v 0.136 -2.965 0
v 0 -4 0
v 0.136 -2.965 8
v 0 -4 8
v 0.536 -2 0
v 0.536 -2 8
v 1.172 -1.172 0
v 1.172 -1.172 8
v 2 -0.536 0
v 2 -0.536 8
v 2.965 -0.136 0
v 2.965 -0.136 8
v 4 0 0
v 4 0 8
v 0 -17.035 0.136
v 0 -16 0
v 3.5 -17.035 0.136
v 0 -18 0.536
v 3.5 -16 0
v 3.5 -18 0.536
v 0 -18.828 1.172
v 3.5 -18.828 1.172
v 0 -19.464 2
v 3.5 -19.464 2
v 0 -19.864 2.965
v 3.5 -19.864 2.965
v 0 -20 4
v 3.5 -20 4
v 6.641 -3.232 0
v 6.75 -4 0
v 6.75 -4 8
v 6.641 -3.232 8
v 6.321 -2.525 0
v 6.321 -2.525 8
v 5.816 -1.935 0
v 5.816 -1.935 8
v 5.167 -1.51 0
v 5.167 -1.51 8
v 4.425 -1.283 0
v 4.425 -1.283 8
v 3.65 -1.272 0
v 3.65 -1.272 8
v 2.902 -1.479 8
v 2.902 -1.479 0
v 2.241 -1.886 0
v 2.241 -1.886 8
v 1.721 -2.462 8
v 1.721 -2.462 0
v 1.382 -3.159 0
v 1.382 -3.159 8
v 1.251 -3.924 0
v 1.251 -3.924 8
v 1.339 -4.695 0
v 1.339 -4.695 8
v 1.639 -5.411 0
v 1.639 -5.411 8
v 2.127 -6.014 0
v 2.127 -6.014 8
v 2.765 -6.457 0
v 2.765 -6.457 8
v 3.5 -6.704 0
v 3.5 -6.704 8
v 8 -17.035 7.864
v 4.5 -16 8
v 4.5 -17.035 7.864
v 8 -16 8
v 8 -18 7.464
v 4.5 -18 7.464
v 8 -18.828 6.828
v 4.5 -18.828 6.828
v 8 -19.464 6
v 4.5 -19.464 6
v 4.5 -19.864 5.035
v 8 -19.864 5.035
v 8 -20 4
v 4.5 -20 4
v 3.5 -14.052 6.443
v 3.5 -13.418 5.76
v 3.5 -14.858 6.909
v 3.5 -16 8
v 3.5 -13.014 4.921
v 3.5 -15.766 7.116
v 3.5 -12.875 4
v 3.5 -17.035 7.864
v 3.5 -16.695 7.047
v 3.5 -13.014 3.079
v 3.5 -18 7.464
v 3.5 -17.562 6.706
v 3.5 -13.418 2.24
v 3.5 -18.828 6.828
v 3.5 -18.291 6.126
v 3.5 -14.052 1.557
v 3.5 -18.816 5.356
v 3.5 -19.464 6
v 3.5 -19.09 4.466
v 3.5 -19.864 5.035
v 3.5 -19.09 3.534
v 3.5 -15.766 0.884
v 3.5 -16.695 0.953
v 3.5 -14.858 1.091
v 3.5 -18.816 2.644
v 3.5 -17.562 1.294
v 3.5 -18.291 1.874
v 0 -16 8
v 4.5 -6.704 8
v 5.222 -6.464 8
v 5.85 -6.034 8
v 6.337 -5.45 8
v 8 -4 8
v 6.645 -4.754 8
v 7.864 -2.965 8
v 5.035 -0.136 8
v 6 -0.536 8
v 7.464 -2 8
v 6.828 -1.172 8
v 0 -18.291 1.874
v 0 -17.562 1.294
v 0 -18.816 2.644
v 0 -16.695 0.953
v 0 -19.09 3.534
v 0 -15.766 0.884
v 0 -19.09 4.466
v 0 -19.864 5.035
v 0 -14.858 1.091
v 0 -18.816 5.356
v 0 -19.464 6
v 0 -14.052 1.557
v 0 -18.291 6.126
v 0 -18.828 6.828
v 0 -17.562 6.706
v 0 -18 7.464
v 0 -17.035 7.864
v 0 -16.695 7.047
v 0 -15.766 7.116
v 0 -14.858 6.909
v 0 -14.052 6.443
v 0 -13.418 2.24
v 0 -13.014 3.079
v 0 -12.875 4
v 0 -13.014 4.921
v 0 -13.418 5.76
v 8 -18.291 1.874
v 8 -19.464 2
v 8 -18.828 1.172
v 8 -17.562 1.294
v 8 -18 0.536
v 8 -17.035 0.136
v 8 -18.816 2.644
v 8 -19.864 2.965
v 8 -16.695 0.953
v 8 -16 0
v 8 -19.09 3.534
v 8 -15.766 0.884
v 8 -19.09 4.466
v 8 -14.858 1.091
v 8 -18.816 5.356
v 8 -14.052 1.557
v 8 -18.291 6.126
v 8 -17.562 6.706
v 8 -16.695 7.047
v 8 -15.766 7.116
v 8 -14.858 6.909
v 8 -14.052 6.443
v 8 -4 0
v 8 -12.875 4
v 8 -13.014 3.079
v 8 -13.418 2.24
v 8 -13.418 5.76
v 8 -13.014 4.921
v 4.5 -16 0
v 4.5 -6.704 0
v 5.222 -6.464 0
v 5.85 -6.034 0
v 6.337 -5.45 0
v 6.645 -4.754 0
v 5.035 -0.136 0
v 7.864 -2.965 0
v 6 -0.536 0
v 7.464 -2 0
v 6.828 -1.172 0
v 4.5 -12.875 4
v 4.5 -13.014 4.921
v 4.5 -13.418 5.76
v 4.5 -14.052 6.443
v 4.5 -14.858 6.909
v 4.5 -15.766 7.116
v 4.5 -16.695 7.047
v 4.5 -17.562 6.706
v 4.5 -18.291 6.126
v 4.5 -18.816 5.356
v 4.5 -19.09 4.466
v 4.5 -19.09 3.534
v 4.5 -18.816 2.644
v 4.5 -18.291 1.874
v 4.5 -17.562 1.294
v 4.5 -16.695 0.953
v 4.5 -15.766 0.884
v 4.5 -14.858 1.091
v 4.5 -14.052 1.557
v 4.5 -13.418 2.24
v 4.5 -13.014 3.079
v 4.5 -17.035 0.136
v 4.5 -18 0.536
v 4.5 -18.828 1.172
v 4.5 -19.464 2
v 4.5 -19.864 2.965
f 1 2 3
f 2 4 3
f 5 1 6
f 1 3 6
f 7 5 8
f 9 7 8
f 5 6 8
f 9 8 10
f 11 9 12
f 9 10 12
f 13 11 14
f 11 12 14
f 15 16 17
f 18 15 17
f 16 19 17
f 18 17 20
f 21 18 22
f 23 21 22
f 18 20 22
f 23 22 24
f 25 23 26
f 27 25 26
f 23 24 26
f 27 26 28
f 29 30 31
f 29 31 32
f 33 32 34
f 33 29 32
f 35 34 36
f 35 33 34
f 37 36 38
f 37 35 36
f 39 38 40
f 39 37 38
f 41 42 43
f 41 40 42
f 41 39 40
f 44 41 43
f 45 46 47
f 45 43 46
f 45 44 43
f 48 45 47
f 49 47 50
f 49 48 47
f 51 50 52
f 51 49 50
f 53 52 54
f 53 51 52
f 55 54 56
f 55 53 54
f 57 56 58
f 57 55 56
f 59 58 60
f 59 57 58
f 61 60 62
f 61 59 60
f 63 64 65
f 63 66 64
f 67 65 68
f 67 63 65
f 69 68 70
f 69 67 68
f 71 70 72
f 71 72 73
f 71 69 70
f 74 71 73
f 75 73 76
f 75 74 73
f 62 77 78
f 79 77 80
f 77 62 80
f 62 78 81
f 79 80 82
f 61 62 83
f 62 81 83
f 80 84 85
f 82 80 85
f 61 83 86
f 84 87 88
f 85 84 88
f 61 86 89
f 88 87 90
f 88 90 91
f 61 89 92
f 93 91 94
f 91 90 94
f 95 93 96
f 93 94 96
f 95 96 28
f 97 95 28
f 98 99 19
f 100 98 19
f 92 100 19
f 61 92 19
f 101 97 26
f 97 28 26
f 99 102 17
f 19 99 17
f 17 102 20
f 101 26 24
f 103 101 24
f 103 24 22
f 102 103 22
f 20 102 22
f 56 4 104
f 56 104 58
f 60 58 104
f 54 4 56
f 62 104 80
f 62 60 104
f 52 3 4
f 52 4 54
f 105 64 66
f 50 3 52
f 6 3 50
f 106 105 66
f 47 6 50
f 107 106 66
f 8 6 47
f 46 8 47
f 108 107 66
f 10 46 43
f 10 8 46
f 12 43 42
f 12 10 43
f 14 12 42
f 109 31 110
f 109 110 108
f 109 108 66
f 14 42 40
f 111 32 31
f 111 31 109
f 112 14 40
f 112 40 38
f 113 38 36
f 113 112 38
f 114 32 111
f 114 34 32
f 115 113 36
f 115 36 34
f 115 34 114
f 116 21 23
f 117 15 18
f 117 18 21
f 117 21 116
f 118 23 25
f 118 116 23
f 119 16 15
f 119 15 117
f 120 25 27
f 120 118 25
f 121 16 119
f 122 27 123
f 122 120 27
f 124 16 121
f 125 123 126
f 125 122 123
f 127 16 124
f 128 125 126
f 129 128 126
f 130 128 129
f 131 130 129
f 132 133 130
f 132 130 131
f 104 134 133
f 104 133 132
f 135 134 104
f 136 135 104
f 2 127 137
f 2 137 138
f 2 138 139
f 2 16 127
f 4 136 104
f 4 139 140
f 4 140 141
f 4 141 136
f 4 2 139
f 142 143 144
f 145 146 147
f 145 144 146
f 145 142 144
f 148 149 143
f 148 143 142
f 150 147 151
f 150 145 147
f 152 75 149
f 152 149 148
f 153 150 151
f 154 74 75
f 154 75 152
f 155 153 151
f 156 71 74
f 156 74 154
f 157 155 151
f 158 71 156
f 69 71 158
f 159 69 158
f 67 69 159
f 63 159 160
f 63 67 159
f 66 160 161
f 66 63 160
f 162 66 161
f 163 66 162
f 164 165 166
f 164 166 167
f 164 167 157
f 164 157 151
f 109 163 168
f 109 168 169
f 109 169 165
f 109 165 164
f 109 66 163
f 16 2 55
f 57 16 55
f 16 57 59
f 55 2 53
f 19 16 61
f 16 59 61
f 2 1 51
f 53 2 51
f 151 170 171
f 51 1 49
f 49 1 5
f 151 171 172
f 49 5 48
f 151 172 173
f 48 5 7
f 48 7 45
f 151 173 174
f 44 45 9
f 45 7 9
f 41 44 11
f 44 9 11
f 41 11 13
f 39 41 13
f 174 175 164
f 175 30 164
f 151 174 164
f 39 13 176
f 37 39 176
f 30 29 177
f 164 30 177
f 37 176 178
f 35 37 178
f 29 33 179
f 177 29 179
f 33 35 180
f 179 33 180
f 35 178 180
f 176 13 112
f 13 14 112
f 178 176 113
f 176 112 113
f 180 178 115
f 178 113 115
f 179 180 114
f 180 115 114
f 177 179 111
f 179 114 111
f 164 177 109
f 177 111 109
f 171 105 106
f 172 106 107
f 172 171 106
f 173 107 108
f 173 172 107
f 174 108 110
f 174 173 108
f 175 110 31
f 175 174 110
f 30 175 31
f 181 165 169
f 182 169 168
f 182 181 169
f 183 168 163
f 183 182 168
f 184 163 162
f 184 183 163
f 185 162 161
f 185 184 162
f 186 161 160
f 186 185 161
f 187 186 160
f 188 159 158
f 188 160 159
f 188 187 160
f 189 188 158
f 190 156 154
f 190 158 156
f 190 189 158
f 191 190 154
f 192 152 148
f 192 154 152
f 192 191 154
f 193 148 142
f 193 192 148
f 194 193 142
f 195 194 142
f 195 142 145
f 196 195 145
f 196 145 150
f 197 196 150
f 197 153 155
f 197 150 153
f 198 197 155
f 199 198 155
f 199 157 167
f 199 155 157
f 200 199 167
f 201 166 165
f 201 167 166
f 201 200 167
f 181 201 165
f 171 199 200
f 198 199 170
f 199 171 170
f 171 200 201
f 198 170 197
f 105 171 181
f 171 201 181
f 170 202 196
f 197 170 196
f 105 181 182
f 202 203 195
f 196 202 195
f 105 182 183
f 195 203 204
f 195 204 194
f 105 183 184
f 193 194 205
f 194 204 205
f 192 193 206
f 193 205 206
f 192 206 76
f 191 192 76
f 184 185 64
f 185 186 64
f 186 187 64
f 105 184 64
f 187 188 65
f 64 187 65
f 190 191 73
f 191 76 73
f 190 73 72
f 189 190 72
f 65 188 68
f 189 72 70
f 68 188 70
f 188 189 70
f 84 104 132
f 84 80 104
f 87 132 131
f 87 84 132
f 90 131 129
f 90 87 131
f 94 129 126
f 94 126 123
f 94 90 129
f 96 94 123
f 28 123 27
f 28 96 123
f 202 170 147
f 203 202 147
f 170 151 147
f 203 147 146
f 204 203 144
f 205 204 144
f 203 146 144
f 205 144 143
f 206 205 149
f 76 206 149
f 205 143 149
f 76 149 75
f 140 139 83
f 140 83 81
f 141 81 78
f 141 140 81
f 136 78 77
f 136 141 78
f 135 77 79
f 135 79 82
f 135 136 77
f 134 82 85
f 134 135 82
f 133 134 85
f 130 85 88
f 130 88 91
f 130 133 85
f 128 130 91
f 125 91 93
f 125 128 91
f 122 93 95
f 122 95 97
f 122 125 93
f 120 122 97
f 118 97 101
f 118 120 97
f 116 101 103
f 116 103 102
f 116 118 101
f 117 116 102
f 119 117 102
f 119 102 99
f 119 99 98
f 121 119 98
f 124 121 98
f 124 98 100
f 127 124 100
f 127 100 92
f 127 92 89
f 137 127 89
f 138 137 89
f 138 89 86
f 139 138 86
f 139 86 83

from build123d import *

# Parameters (mm, degrees)
F0_W      = 8
F0_H      = 8
F1_DEPTH  = 20
F3_DEPTH  = 15
F4_R      = 3.99999
F6_DEPTH  = 10
F7_R      = 3.125
F8_DEPTH  = 8.001
F9_DEPTH  = 25
F10_DEPTH = 27


# Not quite as in the source:
# - a fillet or chamfer is up to 0.001 mm smaller than in the source, because OpenCascade refuses the exact size


with BuildPart() as f1:
    # F0 (on Front) → F1 (new body)
    with BuildSketch(Plane.XZ):
        with Locations((4, 4)):
            Rectangle(F0_W, F0_H)
    extrude(amount=F1_DEPTH)

    # F2 (on face) → F3 (cut)
    with BuildSketch(Plane.XZ.offset(20)):
        Polygon((4.5, 8), (4, 8), (3.5, 8), (3.5, 0), (4.5, 0), align=None)
    extrude(amount=-F3_DEPTH, mode=Mode.SUBTRACT)

    # F4 (radius 4 in the source; OpenCascade refuses exactly that, so slightly less here)
    f4_edges = [f1.edges().sort_by_distance(p)[0] for p in [
        (1.75, -20, 8),
        (6.25, -20, 8),
        (6.25, -20, 0),
        (1.75, -20, 0),
        (8, 0, 4),
        (0, 0, 4),
    ]]
    fillet(f4_edges, radius=F4_R)

    # F5 (on face) → F6 (join)
    with BuildSketch(Plane.XY.offset(8)):
        with BuildLine():
            Line((3.5, -5), (3.5, -6.7041634566))
            ThreePointArc((3.5, -6.7041634566), (4, -6.75), (4.5, -6.7041634566))
            Line((4.5, -6.7041634566), (4.5, -5))
            Line((4.5, -5), (3.5, -5))
        make_face()
        with BuildLine():
            ThreePointArc((4.5, -6.7041634566), (6.1139418157, -5.7589059099), (6.75, -4))
            ThreePointArc((6.75, -4), (2.2410940901, -1.8860581843), (3.5, -6.7041634566))
            Line((3.5, -6.7041634566), (3.5, -5))
            Line((3.5, -5), (4.5, -5))
            Line((4.5, -5), (4.5, -6.7041634566))
        make_face()
    extrude(amount=-F6_DEPTH)

    # F7 (on face) → F8 (join, through all)
    with BuildSketch(Plane.YZ.offset(8)):
        with Locations((-16, 4)):
            Circle(F7_R)
    extrude(amount=-F8_DEPTH)

    # F9 (cut): a face of the model
    f9_faces = [f1.faces().sort_by_distance(p)[0] for p in [
        (4, -4, -2),
    ]]
    extrude(f9_faces, amount=-F9_DEPTH, mode=Mode.SUBTRACT)

    # F10 (cut): a face of the model
    f10_faces = [f1.faces().sort_by_distance(p)[0] for p in [
        (-0.001, -16, 4),
    ]]
    extrude(f10_faces, amount=-F10_DEPTH, mode=Mode.SUBTRACT)


solid = f1.part
